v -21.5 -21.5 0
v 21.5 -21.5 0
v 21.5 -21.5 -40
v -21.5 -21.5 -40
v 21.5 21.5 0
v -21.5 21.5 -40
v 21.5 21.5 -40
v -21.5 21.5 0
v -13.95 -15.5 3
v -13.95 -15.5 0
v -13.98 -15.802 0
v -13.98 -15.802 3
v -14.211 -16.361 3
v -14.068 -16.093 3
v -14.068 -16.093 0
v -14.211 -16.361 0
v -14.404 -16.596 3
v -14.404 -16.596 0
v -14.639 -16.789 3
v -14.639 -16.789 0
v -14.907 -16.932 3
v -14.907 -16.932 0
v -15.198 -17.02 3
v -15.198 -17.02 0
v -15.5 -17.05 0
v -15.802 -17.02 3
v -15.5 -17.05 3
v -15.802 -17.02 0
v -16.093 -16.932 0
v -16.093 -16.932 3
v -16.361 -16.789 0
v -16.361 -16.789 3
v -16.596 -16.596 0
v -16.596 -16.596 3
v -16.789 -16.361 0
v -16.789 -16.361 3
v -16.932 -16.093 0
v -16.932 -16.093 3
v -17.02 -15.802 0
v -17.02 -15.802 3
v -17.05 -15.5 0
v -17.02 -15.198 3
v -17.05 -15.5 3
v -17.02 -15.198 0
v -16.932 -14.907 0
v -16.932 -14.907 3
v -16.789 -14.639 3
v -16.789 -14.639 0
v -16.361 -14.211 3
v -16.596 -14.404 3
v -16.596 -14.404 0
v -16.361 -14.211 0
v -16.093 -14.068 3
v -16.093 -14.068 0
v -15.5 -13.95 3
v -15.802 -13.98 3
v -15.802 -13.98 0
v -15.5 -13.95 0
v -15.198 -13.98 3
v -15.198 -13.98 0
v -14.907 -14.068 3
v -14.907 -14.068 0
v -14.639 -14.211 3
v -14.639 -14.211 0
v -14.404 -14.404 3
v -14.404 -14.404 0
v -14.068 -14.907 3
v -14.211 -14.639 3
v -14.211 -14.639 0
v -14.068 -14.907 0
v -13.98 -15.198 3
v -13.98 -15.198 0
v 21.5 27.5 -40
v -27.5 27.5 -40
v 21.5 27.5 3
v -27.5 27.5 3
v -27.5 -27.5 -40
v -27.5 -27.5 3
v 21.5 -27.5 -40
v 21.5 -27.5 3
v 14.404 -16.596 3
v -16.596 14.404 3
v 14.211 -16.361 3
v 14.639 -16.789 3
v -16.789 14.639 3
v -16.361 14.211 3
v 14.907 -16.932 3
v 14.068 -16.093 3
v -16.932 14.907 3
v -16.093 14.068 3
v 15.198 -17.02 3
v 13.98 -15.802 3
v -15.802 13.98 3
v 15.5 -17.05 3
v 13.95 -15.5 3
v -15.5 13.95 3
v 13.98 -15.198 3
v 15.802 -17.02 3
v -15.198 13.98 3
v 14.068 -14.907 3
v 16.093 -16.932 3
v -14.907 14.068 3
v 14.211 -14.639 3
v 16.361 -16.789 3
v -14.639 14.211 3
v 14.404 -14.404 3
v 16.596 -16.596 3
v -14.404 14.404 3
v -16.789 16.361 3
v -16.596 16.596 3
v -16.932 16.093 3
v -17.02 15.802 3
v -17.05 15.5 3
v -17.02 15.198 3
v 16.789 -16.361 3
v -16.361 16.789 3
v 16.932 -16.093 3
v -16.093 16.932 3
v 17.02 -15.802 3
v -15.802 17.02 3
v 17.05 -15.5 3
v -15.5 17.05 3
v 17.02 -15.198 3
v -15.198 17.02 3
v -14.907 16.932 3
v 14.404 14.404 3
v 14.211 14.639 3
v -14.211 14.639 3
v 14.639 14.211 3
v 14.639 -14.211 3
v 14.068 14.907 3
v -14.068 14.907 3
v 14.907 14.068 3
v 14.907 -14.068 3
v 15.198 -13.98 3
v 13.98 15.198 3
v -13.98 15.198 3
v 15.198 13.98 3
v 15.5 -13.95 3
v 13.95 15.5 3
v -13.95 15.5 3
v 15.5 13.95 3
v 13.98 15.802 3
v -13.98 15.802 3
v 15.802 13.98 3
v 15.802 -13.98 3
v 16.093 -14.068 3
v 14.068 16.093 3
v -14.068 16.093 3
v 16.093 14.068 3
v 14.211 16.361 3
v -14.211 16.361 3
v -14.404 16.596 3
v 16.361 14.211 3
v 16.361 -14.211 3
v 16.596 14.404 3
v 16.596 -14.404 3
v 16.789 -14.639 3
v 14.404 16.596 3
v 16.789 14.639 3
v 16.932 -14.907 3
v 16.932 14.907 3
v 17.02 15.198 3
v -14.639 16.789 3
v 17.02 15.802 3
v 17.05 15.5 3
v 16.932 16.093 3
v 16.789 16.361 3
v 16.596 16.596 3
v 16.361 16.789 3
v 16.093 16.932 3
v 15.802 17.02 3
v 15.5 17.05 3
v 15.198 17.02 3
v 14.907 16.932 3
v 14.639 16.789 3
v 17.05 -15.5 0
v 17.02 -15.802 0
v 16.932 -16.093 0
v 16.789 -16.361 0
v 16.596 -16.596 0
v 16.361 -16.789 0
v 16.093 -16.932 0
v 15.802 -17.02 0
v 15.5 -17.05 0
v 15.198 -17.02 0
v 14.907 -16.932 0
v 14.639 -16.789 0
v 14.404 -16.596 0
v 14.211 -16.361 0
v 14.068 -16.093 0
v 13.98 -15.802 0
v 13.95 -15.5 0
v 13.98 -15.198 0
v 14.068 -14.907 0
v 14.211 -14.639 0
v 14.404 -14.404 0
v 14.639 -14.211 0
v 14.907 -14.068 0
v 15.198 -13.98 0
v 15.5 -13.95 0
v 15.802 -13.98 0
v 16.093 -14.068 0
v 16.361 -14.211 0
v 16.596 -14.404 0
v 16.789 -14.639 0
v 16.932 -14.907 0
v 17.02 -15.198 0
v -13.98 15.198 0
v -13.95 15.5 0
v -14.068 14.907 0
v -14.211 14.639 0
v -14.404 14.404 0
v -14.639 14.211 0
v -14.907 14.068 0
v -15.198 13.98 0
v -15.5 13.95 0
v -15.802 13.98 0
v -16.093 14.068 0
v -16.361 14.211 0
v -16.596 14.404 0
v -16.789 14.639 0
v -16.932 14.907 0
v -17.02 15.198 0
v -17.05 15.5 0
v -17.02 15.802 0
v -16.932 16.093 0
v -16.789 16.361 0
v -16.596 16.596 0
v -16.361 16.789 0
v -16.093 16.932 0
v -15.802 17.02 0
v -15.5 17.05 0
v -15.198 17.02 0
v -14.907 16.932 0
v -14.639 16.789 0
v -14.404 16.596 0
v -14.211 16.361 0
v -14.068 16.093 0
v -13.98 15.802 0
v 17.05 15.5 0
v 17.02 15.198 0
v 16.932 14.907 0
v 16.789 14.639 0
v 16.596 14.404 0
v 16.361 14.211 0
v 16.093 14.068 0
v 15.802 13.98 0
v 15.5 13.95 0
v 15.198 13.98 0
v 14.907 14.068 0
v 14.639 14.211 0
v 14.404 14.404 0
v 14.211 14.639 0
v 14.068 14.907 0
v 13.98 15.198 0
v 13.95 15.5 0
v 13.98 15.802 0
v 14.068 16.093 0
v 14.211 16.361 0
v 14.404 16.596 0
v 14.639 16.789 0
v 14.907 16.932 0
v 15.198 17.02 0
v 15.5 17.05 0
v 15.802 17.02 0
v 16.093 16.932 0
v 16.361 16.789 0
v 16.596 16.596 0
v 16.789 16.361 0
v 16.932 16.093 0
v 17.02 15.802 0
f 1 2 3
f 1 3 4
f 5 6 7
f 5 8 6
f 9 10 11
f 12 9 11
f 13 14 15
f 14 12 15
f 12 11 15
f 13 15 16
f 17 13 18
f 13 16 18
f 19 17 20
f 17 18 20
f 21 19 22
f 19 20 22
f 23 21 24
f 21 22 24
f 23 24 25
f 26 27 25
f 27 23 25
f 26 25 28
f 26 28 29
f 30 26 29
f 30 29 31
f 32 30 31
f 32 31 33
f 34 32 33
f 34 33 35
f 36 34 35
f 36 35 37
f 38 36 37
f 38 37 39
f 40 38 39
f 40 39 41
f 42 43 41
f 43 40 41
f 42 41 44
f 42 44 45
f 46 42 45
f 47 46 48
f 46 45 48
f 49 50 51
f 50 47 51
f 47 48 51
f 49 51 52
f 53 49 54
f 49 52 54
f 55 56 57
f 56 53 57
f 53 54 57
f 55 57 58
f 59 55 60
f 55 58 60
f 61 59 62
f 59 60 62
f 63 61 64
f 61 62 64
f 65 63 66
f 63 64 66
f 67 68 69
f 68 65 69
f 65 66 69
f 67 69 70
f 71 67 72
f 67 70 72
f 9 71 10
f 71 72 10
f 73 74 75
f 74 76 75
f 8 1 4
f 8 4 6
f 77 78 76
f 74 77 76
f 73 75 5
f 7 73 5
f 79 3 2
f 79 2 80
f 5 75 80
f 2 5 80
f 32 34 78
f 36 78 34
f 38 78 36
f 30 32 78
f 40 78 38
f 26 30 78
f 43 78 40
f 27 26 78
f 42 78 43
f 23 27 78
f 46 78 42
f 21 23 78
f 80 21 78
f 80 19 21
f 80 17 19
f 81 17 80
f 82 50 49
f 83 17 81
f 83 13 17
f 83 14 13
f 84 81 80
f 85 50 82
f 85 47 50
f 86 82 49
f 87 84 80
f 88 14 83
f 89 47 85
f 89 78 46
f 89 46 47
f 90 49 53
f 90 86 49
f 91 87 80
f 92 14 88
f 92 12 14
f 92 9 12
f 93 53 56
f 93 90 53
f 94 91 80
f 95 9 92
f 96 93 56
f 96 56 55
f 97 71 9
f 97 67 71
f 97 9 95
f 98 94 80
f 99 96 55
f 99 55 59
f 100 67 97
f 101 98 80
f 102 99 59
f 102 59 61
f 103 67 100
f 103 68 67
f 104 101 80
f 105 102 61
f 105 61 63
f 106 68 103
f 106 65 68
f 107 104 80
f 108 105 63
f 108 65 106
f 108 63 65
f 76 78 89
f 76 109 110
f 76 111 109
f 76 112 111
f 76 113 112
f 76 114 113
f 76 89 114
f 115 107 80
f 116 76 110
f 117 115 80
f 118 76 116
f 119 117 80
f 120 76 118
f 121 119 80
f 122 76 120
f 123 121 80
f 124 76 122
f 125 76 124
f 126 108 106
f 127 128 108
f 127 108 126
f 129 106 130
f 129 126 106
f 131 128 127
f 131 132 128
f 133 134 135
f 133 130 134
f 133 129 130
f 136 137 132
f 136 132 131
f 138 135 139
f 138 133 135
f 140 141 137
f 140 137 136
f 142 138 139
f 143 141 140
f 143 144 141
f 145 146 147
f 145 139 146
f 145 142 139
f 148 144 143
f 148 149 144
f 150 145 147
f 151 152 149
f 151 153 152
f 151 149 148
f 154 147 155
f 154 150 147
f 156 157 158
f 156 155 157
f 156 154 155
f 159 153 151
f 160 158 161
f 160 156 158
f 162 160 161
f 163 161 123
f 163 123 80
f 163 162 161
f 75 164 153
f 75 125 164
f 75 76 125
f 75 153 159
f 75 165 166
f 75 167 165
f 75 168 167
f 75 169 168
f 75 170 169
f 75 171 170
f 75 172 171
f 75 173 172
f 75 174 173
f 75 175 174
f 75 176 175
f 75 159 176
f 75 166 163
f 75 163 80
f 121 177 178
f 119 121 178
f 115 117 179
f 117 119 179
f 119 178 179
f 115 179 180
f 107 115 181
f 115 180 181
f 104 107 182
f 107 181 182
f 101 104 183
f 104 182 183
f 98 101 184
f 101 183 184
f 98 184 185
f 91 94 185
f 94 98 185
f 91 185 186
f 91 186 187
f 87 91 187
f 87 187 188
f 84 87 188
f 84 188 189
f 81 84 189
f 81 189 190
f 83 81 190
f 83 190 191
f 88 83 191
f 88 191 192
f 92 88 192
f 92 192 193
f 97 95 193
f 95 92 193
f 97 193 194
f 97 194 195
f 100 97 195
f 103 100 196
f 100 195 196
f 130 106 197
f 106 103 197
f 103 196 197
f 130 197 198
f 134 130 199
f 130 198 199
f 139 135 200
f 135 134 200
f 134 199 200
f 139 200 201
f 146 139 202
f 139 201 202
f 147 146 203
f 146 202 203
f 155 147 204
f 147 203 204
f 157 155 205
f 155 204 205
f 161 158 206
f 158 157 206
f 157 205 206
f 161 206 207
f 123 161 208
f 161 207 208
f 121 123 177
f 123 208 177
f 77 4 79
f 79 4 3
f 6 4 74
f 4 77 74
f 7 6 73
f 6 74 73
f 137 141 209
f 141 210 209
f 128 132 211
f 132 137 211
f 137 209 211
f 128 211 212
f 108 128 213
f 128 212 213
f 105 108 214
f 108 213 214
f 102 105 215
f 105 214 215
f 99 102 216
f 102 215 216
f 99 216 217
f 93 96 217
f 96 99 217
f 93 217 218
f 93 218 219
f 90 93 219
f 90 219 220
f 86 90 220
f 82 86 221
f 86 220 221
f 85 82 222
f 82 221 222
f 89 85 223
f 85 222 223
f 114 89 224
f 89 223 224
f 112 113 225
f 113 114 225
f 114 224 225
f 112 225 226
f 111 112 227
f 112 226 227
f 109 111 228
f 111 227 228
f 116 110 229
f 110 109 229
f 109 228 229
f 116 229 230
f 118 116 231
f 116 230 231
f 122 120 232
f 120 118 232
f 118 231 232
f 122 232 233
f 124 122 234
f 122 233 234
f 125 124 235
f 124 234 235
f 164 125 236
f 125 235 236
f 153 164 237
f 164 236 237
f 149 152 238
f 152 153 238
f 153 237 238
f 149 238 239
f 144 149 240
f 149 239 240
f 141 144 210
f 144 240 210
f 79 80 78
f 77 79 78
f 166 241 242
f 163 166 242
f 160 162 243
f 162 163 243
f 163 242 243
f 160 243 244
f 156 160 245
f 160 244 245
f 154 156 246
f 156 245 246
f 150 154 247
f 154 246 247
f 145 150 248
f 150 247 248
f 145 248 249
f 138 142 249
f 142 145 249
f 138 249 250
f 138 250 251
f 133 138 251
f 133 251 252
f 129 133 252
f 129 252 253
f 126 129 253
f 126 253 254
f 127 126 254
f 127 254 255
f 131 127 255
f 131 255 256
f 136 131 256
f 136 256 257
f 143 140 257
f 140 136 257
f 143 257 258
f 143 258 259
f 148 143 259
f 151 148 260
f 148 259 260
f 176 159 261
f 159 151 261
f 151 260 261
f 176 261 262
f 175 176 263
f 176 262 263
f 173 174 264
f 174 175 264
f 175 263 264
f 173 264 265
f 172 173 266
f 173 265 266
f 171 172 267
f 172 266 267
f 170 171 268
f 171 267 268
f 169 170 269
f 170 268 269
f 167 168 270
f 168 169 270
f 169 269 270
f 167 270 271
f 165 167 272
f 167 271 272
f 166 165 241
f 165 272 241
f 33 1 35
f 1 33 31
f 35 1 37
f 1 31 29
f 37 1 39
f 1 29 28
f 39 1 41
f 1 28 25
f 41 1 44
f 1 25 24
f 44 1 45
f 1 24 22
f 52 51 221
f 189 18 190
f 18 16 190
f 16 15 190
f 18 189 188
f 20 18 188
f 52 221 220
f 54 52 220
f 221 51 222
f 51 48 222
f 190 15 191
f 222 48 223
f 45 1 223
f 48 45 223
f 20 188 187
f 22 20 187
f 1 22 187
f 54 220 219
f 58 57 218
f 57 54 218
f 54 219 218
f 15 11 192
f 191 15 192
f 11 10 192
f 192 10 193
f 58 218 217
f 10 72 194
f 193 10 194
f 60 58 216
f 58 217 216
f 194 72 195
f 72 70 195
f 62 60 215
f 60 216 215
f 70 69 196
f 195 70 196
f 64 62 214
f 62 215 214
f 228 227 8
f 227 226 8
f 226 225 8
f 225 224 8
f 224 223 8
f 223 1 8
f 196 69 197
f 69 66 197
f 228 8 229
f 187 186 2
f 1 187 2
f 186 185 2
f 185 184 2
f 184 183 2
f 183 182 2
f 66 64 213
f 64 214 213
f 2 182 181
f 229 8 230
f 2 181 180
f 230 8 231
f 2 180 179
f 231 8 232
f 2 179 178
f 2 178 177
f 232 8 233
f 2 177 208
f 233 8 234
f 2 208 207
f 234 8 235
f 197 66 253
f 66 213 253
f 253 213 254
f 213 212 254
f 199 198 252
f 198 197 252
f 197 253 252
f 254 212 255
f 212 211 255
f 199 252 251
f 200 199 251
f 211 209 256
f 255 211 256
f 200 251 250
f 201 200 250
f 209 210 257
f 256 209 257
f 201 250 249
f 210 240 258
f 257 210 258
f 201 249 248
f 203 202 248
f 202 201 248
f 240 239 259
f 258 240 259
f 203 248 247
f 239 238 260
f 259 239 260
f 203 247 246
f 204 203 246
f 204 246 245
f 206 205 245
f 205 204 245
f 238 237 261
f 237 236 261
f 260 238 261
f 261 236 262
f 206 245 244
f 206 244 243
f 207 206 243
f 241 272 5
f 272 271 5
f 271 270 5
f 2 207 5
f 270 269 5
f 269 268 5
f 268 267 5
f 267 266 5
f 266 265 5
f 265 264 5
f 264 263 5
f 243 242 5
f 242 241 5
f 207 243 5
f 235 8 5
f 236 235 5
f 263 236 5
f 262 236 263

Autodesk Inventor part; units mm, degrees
ref_plane "YZ Plane" through (0, 0, 0) normal (1, 0, 0) x (0, 1, 0)
ref_plane "XZ Plane" through (0, 0, 0) normal (0, 1, 0) x (-1, 0, 0)
sketch "Эскиз1" plane through (0, 0, 0) normal (0, 0, 1) x (1, 0, 0)
  line L0 (21.5, 21.5) -> (21.5, -21.5)
  line L1 (21.5, -21.5) -> (-21.5, -21.5)
  line L2 (-21.5, -21.5) -> (-21.5, 21.5)
  line L3 (-21.5, 21.5) -> (21.5, 21.5)
  line L4 (21.5, 21.5) -> (-21.5, -21.5) construction
  line L5 (21.5, -21.5) -> (-21.5, 21.5) construction
  circle A0 centre (15.5, -15.5) radius 1.55 projected
  circle A1 centre (-15.5, -15.5) radius 1.55 projected
  circle A2 centre (-15.5, 15.5) radius 1.55 projected
  circle A3 centre (15.5, 15.5) radius 1.55 projected
  line L6 (21.5, -21.5) -> (21.5, -27.5)
  line L7 (21.5, -27.5) -> (-27.5, -27.5)
  line L8 (-27.5, -27.5) -> (-27.5, 27.5)
  line L9 (-27.5, 27.5) -> (21.5, 27.5)
  line L10 (21.5, 27.5) -> (21.5, 21.5)
  point P0 (0, 0)
  dimension "d0" = 43
  dimension "d1" = 43
  dimension "d2" = 6
  dimension "d3" = 49
  dimension "d4" = 55
ref_plane "РабПлоскость1" through (-20.5, -20.5, -40) normal (0, 0, -1) x (0, 1, 0)
extrude "Выдавливание1" add sketch "Эскиз1" against normal up to surface (40 mm away) contours L3 L2 L1 L6 L7 L8 L9 L10
sketch "Эскиз3" plane through (0, 0, 0) normal (0, 0, 1) x (1, 0, 0)
  circle A0 centre (15.5, -15.5) radius 1.55 projected
  circle A1 centre (-15.5, -15.5) radius 1.55 projected
  circle A2 centre (-15.5, 15.5) radius 1.55 projected
  circle A3 centre (15.5, 15.5) radius 1.55 projected
  line L0 (-27.5, -27.5) -> (21.5, -27.5) projected
  line L1 (21.5, -21.5) -> (21.5, -27.5) projected
  line L2 (21.5, 21.5) -> (21.5, -21.5) projected
  line L3 (21.5, 27.5) -> (21.5, 21.5) projected
  line L4 (21.5, 27.5) -> (-27.5, 27.5) projected
  line L5 (-27.5, 27.5) -> (-27.5, -27.5) projected
  point P0 (0, 0)
extrude "Выдавливание2" add sketch "Эскиз3" along normal blind 3
properties part number "Держатель"
